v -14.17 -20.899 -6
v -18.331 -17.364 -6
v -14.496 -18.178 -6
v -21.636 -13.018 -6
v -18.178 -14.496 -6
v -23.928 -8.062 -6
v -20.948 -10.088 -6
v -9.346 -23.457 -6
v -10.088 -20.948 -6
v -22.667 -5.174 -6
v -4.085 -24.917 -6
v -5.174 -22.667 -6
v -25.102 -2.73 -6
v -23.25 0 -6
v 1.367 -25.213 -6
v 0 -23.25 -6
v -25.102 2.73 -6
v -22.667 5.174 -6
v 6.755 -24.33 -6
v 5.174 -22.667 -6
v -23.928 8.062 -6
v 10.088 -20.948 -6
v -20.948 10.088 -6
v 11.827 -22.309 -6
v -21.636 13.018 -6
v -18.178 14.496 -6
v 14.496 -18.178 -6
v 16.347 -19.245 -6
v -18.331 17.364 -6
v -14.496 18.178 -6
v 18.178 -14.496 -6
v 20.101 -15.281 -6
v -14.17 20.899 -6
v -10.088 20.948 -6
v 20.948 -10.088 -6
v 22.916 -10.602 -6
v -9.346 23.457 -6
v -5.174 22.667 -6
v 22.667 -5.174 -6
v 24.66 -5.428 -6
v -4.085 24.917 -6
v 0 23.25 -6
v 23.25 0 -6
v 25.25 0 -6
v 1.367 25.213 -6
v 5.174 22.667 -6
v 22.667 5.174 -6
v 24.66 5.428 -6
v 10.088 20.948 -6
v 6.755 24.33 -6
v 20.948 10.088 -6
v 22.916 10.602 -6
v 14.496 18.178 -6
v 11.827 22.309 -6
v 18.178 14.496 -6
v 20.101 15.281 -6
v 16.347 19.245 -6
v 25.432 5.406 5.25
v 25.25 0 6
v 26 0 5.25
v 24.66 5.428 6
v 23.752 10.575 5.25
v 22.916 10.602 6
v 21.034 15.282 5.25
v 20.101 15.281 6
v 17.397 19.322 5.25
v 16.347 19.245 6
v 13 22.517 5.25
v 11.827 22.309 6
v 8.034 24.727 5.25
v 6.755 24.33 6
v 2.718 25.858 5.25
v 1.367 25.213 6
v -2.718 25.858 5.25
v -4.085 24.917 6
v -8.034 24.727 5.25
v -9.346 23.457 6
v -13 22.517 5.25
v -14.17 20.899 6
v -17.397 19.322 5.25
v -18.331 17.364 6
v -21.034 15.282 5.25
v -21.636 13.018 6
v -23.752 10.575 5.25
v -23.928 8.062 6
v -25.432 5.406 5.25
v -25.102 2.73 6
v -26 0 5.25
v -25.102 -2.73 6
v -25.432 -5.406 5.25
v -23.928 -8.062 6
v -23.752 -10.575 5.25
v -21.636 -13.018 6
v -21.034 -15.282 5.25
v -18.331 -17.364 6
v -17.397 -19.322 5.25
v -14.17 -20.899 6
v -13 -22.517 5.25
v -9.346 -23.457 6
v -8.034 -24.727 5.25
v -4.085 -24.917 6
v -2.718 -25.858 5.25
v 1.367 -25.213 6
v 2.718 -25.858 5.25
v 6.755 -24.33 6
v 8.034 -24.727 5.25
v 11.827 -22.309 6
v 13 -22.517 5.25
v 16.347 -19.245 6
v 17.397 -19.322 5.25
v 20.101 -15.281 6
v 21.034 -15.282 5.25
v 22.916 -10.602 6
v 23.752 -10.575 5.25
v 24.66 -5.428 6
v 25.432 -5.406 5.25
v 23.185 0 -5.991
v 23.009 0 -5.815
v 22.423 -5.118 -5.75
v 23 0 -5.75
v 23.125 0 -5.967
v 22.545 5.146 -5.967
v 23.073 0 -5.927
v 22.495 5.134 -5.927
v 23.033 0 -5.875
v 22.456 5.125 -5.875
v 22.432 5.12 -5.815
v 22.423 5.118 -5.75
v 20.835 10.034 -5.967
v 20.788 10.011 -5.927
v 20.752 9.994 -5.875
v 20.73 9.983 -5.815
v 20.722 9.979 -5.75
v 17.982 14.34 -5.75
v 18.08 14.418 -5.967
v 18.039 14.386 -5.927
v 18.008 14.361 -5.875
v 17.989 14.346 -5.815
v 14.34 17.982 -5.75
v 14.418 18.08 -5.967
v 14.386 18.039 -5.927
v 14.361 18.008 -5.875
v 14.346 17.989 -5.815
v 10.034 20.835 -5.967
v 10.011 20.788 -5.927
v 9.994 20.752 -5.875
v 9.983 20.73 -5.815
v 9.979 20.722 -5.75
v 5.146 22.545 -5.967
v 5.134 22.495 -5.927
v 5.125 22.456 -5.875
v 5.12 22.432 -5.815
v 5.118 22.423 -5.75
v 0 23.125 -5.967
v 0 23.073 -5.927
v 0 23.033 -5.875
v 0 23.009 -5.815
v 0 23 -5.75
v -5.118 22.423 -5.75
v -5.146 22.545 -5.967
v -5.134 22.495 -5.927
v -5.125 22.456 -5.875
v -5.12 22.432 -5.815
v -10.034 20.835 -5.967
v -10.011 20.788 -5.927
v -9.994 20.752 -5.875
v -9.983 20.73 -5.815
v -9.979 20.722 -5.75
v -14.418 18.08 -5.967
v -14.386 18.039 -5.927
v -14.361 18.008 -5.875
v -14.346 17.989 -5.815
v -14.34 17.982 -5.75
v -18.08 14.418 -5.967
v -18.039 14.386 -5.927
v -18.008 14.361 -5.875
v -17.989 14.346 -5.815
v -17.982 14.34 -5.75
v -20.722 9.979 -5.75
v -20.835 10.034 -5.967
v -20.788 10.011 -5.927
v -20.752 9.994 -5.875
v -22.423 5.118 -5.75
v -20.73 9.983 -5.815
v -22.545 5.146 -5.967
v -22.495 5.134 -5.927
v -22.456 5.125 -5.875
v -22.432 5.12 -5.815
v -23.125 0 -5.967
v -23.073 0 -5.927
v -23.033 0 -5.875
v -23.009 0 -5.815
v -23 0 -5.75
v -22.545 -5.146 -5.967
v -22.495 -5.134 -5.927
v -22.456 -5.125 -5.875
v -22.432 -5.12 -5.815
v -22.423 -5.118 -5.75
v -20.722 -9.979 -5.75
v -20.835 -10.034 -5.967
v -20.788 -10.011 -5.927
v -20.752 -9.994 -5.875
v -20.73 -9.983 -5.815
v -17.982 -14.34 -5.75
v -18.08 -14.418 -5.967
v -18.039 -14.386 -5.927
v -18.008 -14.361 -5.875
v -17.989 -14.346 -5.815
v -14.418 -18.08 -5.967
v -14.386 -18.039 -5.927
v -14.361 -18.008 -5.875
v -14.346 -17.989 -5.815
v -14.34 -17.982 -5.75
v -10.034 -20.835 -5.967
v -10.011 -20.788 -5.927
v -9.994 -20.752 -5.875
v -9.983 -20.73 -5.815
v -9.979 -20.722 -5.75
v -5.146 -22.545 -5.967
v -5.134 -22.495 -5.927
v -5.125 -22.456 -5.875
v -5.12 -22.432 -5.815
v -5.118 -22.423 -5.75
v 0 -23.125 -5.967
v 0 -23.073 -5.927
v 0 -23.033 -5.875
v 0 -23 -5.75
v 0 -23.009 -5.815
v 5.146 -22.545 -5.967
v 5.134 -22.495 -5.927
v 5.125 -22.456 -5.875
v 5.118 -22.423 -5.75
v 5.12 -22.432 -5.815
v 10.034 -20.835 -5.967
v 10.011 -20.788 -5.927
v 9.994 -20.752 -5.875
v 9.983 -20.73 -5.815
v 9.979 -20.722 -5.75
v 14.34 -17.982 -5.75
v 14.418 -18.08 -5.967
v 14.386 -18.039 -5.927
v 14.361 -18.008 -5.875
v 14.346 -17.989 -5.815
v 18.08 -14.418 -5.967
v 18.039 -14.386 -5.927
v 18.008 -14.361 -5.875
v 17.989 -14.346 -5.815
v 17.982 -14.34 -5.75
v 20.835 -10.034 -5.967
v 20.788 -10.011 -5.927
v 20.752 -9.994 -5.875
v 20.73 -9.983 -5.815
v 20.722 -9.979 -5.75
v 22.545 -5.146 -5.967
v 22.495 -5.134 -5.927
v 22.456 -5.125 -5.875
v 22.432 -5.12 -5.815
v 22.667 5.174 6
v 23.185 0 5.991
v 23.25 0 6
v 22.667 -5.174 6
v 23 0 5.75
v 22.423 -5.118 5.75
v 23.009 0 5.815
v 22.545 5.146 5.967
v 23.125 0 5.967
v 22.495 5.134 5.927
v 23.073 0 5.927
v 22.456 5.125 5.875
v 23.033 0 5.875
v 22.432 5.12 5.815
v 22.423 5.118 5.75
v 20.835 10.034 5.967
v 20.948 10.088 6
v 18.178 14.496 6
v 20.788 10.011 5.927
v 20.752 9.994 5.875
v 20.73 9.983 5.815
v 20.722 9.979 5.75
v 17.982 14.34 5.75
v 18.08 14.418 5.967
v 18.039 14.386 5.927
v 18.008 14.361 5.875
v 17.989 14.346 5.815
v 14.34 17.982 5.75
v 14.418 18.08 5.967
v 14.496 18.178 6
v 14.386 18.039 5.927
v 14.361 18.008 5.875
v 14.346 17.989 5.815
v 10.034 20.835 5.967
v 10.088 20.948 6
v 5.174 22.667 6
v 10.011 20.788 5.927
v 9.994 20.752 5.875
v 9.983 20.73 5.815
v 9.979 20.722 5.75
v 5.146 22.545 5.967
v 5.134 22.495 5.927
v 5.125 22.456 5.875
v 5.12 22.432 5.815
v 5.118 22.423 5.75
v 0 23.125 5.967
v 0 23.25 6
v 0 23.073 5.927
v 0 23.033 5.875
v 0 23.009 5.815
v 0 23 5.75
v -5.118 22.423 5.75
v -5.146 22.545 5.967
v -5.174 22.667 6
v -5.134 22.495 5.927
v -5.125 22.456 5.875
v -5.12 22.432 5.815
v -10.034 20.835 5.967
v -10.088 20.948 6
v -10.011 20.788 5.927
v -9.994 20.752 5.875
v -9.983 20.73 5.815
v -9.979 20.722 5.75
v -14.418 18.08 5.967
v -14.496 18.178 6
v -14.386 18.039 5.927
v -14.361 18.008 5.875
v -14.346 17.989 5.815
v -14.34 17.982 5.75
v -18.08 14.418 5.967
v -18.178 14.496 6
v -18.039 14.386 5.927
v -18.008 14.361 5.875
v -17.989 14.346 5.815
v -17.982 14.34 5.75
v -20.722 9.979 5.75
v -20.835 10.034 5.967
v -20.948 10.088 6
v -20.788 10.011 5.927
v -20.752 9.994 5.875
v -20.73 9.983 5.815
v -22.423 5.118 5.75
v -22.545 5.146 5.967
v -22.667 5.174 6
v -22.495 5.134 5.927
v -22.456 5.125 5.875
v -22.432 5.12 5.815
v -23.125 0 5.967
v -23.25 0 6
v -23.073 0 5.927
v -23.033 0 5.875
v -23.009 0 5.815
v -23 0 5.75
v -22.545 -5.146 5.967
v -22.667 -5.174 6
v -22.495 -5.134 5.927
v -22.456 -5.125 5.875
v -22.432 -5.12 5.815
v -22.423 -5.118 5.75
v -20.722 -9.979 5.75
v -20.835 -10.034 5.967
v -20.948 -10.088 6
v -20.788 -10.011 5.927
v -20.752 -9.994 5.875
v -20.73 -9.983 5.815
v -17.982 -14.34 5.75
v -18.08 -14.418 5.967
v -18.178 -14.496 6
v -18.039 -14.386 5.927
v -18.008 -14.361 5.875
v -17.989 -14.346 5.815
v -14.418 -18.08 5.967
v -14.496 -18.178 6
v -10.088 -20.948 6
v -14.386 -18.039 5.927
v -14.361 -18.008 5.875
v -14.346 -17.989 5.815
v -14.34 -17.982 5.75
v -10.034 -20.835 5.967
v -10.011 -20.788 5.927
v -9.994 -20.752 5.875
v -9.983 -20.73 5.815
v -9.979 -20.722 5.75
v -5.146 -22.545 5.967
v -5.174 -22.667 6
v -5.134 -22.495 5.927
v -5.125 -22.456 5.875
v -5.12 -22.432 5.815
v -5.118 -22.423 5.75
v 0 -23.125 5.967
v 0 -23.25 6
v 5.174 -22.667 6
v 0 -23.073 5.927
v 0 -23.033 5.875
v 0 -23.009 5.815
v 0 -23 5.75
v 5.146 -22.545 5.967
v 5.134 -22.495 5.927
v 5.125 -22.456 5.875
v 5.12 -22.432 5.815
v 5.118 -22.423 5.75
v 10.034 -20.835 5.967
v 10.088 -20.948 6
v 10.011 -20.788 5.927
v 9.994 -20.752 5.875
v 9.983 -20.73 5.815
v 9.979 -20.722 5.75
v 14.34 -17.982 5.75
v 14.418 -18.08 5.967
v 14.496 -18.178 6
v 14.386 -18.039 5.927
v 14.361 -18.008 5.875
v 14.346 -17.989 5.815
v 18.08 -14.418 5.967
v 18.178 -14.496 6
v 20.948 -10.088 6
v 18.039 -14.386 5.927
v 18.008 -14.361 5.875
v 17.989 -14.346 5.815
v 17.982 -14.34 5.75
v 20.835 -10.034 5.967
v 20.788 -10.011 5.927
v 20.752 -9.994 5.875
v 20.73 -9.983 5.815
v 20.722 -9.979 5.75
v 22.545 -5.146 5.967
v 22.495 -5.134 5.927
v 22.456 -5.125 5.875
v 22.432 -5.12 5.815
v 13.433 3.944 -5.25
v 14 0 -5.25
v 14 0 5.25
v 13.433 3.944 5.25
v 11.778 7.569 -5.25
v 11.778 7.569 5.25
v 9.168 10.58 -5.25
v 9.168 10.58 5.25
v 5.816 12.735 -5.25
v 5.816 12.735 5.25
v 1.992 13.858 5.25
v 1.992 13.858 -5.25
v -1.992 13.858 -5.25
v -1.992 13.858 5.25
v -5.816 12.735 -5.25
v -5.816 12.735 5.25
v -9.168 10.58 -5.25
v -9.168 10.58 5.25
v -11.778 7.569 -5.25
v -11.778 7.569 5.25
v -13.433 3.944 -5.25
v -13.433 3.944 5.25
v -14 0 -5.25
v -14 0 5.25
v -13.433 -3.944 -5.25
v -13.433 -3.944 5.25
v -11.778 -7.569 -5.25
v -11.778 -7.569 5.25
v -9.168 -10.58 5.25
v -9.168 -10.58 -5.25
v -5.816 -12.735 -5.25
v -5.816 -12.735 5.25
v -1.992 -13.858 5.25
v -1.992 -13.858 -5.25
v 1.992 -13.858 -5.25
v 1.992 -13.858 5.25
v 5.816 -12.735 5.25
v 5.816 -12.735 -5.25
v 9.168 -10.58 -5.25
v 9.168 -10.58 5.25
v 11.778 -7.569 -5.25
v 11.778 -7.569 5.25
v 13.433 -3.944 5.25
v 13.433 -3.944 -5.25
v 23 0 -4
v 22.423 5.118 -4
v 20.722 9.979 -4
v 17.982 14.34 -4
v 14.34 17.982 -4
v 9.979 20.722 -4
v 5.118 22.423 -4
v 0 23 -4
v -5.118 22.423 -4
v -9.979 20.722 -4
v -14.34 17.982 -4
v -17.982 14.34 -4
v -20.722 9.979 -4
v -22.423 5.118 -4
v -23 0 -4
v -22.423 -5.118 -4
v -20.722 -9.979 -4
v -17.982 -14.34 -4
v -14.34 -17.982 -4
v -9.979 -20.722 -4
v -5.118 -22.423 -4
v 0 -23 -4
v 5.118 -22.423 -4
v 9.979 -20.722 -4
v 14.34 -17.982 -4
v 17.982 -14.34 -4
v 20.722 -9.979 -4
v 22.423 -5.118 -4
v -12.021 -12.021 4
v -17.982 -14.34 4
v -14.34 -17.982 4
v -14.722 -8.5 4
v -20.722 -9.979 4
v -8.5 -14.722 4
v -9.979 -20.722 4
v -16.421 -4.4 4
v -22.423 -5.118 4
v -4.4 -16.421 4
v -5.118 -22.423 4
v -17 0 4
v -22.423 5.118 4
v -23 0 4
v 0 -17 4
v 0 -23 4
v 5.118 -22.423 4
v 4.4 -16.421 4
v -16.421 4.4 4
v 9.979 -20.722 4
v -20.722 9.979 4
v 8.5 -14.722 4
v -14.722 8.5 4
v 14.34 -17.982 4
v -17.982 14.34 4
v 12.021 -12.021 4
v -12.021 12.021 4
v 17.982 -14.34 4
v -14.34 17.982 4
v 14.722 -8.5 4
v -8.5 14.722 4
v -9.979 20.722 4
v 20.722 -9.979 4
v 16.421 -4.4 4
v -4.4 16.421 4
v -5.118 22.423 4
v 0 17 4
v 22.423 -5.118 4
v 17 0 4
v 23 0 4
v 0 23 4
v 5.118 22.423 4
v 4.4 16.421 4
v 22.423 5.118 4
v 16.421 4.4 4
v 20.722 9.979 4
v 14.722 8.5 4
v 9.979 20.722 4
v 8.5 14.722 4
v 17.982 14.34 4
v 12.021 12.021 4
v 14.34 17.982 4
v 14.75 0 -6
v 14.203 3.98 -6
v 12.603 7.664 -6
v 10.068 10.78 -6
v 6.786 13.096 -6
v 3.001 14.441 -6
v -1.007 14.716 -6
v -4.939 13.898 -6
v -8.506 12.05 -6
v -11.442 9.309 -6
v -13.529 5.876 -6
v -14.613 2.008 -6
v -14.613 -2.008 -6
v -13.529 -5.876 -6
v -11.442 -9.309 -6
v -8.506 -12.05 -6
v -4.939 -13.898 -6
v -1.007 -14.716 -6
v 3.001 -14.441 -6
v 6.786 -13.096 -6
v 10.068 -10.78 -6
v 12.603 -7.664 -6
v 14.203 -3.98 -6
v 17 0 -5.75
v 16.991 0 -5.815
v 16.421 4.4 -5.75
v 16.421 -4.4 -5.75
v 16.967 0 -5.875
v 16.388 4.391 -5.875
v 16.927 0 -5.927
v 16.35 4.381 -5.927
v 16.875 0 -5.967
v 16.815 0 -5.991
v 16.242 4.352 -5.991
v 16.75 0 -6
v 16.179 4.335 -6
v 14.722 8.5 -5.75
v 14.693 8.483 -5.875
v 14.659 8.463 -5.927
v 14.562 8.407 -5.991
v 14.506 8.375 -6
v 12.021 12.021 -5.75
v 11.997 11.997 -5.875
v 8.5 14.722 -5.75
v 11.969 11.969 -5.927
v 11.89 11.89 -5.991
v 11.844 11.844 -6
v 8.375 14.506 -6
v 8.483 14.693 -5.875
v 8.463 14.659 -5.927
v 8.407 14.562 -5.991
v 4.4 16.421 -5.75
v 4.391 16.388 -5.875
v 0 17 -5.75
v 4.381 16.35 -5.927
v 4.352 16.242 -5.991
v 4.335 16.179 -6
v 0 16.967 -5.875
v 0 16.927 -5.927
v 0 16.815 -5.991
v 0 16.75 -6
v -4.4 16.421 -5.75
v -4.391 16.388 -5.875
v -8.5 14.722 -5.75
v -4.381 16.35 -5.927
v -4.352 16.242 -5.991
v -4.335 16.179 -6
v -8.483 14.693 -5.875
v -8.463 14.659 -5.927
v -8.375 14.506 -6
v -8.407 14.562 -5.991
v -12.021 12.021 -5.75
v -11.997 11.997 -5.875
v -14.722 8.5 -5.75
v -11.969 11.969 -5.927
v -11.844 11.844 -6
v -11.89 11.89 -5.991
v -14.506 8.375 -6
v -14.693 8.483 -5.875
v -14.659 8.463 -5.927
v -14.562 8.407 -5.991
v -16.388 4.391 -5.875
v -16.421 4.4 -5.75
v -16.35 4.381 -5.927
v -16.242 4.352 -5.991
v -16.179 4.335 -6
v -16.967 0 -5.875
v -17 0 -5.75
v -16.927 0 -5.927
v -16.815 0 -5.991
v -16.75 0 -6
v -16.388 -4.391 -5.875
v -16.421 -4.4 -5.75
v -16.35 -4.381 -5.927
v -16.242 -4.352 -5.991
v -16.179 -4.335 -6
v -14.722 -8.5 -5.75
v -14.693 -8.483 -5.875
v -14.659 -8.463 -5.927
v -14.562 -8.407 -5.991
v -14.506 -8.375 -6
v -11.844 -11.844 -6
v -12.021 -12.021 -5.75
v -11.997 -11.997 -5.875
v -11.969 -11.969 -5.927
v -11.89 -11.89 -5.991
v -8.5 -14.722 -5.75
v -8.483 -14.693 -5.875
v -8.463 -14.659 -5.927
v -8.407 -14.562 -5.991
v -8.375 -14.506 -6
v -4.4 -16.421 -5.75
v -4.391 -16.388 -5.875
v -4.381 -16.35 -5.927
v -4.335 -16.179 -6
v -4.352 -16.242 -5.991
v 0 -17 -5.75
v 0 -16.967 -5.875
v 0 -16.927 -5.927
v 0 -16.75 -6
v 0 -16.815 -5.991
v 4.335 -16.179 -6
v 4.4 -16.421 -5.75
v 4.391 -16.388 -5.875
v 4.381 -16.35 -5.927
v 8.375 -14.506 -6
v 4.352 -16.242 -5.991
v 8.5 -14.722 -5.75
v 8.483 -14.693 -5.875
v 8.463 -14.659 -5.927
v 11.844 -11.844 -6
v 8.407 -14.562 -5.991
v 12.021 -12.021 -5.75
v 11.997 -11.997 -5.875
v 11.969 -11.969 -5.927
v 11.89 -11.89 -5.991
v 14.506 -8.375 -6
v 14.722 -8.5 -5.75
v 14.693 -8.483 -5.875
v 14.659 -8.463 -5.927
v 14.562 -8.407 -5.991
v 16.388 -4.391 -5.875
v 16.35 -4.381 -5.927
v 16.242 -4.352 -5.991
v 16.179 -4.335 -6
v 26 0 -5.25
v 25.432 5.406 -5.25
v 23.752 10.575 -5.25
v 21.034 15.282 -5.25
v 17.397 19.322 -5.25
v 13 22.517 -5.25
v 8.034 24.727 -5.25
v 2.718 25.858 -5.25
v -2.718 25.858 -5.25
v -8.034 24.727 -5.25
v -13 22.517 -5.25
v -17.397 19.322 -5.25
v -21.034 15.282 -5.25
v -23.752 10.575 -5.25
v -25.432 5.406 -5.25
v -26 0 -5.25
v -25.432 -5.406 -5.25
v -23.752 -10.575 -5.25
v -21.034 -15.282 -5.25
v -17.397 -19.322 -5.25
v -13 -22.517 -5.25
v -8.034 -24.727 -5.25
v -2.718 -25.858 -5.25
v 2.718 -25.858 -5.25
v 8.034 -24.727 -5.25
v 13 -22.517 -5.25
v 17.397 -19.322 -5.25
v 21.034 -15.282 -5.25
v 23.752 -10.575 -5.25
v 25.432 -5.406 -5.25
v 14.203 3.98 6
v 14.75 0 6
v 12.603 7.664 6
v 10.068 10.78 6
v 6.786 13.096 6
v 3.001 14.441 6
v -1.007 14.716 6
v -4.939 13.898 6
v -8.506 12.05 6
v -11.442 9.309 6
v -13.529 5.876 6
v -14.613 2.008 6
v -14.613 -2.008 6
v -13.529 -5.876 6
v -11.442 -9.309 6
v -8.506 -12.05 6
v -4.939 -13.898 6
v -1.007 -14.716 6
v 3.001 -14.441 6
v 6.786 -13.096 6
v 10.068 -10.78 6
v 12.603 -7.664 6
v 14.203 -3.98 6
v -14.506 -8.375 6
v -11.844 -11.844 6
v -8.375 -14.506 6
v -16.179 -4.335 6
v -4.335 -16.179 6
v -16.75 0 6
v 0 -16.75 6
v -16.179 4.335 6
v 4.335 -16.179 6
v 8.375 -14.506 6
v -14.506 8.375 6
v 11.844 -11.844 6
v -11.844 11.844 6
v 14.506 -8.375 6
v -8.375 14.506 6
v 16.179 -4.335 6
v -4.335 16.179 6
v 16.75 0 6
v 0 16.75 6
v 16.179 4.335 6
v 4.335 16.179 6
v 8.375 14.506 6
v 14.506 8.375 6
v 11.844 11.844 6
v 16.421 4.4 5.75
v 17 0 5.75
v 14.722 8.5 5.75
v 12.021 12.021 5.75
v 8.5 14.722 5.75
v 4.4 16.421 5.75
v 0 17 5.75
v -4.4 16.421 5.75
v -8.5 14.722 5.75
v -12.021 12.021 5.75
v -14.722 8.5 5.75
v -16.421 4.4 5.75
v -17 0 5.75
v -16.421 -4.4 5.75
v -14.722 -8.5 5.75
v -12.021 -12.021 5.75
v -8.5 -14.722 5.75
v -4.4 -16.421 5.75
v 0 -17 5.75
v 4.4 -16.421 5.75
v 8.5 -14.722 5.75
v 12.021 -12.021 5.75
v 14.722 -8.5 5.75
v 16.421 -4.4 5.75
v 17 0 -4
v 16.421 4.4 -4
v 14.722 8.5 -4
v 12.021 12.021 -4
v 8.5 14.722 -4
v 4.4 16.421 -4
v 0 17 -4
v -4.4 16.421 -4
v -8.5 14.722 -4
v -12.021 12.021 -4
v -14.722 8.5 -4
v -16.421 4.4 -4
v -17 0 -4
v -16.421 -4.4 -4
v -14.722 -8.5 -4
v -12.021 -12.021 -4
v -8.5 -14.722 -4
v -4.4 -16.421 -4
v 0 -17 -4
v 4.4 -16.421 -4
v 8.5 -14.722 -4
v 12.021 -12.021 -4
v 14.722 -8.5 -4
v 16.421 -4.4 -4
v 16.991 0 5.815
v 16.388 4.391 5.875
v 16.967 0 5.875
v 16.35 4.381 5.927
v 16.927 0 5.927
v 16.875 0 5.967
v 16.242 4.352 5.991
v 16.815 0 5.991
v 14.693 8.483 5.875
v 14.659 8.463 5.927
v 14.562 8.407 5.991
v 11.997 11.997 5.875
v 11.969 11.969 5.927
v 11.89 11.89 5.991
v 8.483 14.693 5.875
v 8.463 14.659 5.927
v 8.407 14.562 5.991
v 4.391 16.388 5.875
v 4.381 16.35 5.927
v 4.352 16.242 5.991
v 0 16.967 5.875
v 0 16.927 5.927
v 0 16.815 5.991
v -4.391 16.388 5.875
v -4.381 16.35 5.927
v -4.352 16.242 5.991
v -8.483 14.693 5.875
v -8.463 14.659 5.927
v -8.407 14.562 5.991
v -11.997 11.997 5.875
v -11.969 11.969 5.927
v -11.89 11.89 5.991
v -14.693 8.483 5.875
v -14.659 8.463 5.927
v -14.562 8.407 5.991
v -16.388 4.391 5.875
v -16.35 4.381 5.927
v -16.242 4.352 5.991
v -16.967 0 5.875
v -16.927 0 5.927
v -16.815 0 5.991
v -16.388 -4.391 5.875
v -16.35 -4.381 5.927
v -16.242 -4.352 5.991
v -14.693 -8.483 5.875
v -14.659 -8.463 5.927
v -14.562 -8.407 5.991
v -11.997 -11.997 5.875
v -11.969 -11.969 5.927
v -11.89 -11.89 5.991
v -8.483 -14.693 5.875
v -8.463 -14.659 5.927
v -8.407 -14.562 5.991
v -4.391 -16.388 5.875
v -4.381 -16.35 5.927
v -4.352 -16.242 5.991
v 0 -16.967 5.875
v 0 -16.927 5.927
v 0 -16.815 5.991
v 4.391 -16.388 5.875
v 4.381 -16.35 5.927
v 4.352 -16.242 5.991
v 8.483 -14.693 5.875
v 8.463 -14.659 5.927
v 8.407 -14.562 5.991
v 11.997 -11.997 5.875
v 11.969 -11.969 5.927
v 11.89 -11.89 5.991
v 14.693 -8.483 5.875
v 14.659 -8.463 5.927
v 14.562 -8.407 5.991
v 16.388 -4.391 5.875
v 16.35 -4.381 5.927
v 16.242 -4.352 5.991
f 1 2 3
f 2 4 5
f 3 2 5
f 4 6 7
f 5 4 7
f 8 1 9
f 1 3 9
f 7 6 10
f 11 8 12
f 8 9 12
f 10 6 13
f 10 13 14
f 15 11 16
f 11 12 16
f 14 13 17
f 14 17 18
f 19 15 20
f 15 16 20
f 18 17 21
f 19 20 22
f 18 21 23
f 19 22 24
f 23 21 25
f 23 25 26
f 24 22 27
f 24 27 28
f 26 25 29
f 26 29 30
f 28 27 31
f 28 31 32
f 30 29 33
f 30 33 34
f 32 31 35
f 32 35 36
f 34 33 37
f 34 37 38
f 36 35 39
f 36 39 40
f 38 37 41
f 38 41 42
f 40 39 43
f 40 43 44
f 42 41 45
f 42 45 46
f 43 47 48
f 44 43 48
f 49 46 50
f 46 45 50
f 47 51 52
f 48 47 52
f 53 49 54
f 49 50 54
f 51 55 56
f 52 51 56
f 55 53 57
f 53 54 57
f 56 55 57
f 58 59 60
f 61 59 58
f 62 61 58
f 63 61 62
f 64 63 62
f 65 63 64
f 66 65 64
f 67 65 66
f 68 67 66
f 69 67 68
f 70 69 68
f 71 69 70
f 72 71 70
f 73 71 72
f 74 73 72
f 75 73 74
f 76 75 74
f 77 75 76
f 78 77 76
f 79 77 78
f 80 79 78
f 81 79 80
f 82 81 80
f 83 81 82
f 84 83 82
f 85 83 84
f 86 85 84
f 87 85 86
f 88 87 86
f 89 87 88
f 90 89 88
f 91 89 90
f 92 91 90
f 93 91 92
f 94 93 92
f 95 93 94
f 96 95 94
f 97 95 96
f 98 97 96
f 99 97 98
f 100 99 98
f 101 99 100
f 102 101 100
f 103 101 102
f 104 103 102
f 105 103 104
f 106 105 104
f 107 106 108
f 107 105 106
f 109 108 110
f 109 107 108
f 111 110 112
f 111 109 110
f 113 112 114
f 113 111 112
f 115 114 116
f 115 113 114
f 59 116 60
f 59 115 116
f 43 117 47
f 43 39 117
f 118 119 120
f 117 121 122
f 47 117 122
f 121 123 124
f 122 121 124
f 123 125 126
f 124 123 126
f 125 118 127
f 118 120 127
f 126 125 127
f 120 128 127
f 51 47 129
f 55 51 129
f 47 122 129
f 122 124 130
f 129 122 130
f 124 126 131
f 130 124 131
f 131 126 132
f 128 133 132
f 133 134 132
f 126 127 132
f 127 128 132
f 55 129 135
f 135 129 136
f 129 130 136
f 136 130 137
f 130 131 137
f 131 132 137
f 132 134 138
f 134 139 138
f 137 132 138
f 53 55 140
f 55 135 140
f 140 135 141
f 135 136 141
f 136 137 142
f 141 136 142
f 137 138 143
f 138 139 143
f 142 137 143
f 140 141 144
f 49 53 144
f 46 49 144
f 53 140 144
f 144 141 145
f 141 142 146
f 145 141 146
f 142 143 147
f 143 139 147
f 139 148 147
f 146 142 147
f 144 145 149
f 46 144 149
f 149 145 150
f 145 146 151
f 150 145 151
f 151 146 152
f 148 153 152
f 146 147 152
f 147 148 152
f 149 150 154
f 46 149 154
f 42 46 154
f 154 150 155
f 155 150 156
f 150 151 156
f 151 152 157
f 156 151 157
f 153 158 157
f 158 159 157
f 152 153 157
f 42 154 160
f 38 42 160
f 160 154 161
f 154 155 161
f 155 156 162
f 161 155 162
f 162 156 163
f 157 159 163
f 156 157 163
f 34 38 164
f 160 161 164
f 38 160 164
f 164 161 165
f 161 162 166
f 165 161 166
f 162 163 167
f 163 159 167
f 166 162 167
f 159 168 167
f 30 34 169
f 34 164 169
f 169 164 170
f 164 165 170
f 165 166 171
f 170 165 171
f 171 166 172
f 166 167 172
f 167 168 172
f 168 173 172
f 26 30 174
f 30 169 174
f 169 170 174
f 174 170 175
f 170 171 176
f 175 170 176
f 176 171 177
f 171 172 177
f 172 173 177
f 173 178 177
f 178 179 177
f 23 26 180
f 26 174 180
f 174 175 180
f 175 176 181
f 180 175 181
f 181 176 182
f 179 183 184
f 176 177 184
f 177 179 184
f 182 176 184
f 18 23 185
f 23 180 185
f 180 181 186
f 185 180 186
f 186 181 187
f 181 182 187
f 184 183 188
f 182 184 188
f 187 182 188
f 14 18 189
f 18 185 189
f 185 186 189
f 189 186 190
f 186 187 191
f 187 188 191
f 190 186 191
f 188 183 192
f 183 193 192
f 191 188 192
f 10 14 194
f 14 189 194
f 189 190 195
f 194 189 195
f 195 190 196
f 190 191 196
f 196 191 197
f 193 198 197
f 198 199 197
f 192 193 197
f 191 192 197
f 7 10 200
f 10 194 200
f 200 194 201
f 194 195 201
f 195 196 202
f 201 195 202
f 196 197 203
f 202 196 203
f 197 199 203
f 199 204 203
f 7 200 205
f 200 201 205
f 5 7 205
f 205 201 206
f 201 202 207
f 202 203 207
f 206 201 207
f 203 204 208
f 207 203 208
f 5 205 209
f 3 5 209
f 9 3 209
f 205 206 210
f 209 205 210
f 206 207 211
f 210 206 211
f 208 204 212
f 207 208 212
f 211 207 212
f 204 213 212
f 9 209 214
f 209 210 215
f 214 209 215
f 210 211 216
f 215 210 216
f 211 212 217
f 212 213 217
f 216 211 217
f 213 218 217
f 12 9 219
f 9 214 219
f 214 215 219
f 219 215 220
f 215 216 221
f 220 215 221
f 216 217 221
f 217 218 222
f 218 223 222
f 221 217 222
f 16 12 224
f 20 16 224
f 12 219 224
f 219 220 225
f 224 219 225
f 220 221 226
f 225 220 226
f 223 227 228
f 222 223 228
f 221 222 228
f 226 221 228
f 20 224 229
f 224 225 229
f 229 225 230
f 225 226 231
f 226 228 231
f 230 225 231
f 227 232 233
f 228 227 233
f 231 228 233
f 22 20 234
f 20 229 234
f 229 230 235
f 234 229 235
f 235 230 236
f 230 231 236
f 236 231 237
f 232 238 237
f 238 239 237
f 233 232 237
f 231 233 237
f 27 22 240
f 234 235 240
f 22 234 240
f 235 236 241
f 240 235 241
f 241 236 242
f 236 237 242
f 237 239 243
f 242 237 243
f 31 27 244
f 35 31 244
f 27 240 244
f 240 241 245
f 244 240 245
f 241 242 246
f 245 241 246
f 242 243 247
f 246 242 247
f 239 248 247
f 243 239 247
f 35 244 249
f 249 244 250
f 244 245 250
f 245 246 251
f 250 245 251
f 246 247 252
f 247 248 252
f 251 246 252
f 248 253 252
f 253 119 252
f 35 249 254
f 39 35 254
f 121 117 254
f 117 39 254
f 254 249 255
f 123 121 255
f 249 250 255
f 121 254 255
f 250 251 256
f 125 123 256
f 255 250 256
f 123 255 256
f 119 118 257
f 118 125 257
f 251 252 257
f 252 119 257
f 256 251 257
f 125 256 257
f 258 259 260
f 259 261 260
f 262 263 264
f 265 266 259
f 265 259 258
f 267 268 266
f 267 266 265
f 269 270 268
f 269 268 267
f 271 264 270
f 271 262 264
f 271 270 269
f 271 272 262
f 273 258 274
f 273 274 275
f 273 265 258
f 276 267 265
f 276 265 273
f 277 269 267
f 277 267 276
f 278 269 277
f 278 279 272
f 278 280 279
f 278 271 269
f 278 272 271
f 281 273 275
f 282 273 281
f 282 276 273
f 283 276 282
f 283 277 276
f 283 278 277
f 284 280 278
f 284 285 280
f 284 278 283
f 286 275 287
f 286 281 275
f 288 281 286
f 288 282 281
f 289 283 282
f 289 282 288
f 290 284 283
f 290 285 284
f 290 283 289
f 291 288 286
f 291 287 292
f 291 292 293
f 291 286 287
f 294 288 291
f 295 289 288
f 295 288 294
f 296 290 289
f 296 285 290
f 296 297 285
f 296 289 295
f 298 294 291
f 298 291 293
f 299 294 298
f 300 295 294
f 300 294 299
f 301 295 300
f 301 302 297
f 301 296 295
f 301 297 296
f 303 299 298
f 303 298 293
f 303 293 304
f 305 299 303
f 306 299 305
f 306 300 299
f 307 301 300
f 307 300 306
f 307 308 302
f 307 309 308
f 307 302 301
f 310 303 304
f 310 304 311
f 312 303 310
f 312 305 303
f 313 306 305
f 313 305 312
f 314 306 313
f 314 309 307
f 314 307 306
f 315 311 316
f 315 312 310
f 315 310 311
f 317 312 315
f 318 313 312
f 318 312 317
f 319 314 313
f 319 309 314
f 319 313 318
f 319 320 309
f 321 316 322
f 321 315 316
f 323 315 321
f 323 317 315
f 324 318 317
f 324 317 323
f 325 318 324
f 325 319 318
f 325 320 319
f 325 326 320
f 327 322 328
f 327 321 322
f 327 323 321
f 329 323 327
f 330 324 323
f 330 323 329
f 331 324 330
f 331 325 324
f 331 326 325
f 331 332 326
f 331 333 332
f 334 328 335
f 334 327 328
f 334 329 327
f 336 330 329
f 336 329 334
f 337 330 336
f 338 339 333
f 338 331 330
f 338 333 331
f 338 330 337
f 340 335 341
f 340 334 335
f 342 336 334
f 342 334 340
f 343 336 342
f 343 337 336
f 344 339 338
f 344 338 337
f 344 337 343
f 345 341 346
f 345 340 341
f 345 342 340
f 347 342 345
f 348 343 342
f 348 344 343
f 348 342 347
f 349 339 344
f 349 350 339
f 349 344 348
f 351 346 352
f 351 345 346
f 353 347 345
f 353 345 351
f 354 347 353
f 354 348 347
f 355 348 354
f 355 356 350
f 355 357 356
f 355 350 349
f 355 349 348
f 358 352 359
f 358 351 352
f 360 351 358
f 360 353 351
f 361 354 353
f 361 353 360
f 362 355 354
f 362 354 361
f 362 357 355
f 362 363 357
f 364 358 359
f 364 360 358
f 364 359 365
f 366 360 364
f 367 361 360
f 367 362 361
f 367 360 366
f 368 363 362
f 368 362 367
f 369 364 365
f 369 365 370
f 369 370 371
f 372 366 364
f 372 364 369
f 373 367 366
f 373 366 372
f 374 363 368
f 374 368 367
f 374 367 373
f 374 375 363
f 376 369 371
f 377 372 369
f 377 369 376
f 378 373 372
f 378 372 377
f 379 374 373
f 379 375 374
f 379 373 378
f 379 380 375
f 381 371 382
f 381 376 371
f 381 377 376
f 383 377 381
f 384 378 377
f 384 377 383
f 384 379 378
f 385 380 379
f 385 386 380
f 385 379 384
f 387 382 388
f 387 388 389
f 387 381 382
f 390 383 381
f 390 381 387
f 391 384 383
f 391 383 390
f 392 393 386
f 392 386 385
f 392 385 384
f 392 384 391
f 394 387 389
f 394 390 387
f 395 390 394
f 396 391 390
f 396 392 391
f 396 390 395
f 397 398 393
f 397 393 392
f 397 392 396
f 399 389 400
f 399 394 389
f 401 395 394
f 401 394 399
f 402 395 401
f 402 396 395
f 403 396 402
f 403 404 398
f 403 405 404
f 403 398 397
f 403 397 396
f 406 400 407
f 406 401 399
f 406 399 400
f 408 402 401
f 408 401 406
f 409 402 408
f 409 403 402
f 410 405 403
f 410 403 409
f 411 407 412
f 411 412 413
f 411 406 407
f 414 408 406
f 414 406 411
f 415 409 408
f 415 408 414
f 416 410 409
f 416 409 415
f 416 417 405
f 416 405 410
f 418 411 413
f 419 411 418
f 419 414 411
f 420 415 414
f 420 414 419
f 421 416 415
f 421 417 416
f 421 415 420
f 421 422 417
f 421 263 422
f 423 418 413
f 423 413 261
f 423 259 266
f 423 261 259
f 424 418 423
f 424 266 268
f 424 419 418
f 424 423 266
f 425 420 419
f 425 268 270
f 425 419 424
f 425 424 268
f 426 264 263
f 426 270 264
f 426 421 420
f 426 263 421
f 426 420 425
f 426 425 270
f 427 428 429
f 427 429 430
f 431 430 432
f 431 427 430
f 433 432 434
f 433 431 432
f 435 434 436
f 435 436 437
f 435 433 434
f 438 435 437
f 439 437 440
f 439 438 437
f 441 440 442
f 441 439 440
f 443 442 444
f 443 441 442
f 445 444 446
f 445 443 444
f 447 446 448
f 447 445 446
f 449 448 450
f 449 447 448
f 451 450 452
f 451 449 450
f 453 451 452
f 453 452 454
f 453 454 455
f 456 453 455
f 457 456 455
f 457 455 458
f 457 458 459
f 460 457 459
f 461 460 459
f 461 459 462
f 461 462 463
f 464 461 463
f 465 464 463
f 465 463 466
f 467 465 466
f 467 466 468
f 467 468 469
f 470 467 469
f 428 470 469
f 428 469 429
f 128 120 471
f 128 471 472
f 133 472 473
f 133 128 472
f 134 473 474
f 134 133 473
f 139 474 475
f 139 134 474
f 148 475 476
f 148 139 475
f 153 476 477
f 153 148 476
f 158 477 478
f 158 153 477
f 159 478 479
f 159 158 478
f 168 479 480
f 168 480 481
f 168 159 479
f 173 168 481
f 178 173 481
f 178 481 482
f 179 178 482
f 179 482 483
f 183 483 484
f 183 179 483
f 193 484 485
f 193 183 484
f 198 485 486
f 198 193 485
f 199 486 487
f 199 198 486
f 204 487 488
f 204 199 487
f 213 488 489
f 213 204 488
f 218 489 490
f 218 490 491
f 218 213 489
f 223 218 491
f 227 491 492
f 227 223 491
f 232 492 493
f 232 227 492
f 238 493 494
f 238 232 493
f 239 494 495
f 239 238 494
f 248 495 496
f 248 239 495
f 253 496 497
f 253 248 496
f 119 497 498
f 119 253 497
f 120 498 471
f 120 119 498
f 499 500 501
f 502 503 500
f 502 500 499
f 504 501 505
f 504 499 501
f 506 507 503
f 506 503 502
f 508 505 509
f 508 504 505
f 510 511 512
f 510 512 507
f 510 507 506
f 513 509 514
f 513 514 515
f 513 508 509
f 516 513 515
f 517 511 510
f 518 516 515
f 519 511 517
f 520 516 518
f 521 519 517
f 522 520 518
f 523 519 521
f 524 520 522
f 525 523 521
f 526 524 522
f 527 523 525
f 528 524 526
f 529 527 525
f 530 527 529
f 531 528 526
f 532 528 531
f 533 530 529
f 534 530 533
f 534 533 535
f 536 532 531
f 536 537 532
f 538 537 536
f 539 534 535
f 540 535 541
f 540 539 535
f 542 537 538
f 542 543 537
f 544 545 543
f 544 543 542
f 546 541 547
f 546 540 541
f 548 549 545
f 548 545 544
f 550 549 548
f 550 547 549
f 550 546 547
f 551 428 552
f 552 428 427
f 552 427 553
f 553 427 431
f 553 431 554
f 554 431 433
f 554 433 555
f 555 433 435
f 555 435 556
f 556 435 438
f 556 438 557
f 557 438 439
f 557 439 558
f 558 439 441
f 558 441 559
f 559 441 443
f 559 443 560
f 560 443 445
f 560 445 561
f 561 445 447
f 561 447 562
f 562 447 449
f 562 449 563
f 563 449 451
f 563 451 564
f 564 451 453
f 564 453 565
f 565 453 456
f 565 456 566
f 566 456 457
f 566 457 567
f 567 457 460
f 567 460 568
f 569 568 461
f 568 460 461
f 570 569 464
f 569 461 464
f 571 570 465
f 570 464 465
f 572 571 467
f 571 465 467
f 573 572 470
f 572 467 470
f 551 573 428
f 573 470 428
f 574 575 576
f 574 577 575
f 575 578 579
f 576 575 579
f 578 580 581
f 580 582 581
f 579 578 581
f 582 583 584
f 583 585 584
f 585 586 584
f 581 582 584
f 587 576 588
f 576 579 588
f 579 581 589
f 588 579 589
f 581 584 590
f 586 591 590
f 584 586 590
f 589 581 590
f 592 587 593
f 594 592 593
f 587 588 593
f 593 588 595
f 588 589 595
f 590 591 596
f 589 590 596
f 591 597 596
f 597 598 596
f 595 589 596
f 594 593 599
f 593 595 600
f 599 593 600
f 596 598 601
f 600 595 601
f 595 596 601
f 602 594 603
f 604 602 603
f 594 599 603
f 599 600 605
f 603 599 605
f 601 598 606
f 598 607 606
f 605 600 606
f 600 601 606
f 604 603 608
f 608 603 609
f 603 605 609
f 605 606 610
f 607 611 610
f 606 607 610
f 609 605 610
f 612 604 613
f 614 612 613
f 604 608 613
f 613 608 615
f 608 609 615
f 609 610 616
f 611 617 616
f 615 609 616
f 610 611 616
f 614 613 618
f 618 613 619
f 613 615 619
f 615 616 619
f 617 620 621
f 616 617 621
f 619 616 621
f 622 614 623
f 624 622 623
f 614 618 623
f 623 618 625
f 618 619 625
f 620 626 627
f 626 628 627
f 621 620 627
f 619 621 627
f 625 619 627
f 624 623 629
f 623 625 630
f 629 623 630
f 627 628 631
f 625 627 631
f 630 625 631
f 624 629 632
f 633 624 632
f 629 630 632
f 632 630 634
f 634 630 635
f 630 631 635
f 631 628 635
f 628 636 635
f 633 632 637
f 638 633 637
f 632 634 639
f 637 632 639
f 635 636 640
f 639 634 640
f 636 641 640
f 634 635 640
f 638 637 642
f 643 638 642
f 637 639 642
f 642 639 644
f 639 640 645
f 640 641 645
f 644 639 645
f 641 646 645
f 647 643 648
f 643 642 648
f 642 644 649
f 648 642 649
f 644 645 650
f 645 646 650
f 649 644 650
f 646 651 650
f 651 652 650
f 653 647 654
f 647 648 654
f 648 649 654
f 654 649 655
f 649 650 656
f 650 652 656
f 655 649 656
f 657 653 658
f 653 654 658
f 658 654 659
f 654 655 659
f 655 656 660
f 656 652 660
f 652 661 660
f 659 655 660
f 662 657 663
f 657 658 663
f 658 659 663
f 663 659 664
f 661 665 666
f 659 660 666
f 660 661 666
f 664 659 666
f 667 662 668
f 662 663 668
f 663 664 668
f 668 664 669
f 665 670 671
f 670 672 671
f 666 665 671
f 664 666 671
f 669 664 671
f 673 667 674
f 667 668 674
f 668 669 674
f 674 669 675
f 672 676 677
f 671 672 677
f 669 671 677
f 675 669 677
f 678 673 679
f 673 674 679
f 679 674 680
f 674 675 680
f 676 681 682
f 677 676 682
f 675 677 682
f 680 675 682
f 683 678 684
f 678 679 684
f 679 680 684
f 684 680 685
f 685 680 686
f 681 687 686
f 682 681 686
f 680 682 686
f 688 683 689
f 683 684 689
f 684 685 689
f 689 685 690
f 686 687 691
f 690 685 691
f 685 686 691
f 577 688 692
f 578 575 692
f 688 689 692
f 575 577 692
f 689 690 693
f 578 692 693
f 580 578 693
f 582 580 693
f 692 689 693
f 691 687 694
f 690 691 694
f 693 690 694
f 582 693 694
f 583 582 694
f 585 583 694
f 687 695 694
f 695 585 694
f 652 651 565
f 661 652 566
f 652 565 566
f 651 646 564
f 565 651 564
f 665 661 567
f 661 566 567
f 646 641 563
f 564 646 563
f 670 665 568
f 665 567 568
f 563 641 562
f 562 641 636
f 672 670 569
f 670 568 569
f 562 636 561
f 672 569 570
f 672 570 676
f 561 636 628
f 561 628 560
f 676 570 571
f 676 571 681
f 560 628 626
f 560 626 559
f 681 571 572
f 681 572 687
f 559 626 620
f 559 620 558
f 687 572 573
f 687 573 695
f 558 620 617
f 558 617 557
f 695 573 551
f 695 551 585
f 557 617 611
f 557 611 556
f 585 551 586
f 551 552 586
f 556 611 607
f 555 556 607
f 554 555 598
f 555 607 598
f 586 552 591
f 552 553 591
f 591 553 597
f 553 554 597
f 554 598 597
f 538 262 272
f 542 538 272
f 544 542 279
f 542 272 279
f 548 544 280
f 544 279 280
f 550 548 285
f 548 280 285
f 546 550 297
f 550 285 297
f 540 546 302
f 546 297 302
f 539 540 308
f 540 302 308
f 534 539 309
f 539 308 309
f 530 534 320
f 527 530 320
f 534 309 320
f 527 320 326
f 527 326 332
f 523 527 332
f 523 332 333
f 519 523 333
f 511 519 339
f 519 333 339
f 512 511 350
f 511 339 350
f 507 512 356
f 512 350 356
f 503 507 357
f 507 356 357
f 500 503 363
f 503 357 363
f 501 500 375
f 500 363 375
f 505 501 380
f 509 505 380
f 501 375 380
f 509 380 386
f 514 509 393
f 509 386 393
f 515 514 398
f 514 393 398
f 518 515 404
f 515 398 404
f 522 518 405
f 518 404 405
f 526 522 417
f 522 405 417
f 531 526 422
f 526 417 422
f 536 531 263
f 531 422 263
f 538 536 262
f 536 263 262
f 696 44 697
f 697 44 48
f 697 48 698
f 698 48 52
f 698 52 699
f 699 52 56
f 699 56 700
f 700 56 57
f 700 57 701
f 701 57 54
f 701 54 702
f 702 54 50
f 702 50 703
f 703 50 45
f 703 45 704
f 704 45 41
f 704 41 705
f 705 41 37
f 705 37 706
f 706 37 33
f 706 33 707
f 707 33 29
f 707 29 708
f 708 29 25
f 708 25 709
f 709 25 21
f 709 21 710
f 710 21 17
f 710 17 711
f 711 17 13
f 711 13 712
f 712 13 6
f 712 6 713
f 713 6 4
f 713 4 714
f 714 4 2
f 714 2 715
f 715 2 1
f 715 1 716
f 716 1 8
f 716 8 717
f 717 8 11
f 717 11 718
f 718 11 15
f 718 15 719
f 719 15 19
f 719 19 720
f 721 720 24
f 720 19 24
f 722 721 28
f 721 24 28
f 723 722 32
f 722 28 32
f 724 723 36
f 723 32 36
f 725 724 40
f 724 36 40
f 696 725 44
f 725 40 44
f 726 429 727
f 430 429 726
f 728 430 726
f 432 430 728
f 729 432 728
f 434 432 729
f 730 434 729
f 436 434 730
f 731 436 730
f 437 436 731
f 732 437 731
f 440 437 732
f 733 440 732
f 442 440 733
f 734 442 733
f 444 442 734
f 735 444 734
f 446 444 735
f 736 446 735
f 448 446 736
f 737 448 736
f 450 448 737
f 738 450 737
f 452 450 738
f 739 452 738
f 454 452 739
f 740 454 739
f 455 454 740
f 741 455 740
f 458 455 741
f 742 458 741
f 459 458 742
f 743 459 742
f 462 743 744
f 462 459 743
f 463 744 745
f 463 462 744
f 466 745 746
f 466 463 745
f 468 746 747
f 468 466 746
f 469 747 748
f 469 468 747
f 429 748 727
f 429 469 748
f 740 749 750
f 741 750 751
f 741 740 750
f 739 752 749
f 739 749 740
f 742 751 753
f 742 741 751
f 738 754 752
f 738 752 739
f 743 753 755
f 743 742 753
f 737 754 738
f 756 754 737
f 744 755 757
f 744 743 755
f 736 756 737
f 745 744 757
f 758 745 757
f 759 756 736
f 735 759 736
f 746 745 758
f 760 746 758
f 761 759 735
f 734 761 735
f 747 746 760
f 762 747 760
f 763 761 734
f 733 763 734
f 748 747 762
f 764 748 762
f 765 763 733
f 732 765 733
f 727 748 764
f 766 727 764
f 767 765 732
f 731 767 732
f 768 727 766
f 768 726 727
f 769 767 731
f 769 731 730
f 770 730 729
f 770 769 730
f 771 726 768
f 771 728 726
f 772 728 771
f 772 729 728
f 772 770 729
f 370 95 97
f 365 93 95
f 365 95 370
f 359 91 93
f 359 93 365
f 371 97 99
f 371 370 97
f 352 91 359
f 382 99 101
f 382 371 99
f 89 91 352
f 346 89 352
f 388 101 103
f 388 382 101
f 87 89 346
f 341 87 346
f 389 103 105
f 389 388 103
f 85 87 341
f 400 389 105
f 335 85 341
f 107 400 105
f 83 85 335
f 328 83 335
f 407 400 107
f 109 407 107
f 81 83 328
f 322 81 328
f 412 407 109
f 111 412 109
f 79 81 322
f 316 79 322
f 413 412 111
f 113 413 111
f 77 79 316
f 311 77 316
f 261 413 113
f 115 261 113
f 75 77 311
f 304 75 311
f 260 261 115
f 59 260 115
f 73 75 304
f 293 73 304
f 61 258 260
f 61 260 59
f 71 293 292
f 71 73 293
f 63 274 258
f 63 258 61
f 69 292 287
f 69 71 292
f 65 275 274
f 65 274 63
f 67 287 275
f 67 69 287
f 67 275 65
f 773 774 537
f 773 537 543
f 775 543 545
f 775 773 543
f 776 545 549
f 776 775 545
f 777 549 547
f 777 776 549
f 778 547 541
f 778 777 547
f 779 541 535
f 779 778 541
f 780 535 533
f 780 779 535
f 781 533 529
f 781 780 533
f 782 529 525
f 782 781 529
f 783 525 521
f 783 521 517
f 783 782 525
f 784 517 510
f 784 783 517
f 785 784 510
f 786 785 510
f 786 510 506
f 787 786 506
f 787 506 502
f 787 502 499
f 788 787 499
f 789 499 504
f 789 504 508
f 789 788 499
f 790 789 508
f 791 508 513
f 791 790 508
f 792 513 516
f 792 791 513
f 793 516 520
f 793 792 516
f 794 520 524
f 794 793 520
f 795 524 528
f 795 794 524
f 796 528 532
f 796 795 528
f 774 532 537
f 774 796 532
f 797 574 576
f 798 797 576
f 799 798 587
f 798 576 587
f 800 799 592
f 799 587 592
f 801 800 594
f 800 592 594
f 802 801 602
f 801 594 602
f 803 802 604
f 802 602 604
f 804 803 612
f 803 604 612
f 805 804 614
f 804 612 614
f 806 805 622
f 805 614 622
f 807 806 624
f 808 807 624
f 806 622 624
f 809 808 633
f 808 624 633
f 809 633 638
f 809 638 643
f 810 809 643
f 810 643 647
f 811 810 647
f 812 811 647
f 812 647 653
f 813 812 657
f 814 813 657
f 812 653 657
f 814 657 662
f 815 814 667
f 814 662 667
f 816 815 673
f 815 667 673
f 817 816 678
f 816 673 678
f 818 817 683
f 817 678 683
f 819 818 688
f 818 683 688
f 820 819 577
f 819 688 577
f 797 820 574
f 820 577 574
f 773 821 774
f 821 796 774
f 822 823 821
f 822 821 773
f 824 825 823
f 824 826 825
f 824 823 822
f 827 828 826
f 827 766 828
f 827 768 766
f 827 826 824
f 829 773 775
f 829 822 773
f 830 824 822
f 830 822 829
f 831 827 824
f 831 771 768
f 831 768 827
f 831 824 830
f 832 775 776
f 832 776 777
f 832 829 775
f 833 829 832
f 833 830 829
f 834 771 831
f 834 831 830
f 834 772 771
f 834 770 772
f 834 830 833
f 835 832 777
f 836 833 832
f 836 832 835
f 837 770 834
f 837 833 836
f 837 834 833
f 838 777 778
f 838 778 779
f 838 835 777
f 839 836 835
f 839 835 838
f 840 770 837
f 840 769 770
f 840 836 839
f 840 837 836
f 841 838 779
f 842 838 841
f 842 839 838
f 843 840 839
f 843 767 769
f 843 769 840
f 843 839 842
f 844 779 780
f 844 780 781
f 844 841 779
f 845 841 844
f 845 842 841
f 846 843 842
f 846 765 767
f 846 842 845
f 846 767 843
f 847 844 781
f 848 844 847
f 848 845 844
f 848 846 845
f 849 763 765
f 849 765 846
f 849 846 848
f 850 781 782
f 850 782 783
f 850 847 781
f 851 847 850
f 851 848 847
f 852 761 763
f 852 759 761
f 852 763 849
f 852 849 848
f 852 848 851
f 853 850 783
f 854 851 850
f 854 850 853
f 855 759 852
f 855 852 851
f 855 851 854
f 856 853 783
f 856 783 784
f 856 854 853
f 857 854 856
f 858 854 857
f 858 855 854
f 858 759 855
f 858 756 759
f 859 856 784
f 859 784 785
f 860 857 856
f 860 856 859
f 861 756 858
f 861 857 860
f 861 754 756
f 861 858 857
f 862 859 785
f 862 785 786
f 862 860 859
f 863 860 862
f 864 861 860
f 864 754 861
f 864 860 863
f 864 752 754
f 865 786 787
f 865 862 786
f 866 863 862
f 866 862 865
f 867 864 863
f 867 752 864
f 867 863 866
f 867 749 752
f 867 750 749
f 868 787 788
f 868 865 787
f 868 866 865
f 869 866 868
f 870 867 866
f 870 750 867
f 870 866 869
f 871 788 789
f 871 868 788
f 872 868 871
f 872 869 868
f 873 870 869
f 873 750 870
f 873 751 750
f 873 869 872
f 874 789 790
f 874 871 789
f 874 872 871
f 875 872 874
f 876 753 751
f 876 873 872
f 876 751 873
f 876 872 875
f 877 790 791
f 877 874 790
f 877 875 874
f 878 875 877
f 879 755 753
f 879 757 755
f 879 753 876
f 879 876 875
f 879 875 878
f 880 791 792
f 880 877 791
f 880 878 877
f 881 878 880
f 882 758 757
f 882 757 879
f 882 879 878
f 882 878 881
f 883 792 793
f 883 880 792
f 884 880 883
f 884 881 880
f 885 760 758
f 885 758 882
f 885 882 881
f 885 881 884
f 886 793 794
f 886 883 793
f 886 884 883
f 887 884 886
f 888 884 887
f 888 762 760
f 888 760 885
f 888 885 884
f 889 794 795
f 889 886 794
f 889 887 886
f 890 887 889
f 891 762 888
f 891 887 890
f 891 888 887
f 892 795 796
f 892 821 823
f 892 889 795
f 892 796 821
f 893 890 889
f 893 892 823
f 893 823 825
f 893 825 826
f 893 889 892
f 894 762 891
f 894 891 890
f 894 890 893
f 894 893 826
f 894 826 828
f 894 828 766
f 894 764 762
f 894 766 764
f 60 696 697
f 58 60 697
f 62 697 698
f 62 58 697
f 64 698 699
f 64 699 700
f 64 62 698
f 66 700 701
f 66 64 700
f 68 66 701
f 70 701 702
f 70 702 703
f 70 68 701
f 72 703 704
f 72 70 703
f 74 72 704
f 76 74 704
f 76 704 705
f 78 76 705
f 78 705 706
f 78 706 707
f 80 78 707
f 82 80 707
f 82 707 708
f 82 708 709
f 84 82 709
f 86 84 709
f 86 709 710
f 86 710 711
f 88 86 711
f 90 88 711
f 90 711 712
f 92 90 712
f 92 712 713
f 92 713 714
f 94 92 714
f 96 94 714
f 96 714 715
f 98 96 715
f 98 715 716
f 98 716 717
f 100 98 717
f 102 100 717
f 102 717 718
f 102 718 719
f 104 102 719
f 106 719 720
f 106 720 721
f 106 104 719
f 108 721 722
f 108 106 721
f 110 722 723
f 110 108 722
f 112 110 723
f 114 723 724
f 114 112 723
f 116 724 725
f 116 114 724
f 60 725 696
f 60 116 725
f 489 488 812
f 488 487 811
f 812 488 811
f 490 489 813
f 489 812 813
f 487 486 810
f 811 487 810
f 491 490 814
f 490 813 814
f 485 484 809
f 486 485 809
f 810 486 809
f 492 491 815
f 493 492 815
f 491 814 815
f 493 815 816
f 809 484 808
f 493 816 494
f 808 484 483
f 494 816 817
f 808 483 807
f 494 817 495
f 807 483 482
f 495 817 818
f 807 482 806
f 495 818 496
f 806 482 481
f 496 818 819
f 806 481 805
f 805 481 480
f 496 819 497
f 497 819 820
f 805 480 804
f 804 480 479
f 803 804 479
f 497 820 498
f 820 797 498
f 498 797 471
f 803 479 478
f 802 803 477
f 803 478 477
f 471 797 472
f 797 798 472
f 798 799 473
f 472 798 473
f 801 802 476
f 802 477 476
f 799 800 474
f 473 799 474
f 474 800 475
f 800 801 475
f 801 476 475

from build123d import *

# Parameters (mm, degrees)
SKETCH_1_R          = 26
SKETCH_1_R_2        = 14
EXTRUDE_1_DEPTH     = 6
SKETCH_2_R          = 23
SKETCH_2_R_2        = 17
CUT_EXTRUDE_1_DEPTH = 2
CHAMFER_1_SIZE      = 0.75
FILLET_1_R          = 0.25


with BuildPart() as part:
    # 草图1 → 凸台-拉伸1 (new, symmetric)
    with BuildSketch(Plane.XY):
        Circle(SKETCH_1_R)
        Circle(SKETCH_1_R_2, mode=Mode.SUBTRACT)
    extrude(amount=EXTRUDE_1_DEPTH, both=True)

    # 草图2 → 切除-拉伸1 (cut)
    with BuildSketch(Plane.XY.offset(6)):
        Circle(SKETCH_2_R)
        Circle(SKETCH_2_R_2, mode=Mode.SUBTRACT)
    cut_extrude_1 = extrude(amount=-CUT_EXTRUDE_1_DEPTH, mode=Mode.SUBTRACT)

    # 镜向1: 切除-拉伸1 across plane
    add(cut_extrude_1.mirror(Plane.XY), mode=Mode.SUBTRACT)

    # 倒角1
    chamfer_1_edges = [part.edges().sort_by_distance(p)[0] for p in [
        (-26, 0, -6),
        (-26, 0, 6),
        (-14, 0, -6),
        (-14, 0, 6),
    ]]
    chamfer(chamfer_1_edges, length=CHAMFER_1_SIZE)

    # 圆角1
    fillet_1_edges = [part.edges().sort_by_distance(p)[0] for p in [
        (-17, 0, 6),
        (-23, 0, 6),
        (-23, 0, -6),
        (-17, 0, -6),
    ]]
    fillet(fillet_1_edges, radius=FILLET_1_R)


solid = part.part
